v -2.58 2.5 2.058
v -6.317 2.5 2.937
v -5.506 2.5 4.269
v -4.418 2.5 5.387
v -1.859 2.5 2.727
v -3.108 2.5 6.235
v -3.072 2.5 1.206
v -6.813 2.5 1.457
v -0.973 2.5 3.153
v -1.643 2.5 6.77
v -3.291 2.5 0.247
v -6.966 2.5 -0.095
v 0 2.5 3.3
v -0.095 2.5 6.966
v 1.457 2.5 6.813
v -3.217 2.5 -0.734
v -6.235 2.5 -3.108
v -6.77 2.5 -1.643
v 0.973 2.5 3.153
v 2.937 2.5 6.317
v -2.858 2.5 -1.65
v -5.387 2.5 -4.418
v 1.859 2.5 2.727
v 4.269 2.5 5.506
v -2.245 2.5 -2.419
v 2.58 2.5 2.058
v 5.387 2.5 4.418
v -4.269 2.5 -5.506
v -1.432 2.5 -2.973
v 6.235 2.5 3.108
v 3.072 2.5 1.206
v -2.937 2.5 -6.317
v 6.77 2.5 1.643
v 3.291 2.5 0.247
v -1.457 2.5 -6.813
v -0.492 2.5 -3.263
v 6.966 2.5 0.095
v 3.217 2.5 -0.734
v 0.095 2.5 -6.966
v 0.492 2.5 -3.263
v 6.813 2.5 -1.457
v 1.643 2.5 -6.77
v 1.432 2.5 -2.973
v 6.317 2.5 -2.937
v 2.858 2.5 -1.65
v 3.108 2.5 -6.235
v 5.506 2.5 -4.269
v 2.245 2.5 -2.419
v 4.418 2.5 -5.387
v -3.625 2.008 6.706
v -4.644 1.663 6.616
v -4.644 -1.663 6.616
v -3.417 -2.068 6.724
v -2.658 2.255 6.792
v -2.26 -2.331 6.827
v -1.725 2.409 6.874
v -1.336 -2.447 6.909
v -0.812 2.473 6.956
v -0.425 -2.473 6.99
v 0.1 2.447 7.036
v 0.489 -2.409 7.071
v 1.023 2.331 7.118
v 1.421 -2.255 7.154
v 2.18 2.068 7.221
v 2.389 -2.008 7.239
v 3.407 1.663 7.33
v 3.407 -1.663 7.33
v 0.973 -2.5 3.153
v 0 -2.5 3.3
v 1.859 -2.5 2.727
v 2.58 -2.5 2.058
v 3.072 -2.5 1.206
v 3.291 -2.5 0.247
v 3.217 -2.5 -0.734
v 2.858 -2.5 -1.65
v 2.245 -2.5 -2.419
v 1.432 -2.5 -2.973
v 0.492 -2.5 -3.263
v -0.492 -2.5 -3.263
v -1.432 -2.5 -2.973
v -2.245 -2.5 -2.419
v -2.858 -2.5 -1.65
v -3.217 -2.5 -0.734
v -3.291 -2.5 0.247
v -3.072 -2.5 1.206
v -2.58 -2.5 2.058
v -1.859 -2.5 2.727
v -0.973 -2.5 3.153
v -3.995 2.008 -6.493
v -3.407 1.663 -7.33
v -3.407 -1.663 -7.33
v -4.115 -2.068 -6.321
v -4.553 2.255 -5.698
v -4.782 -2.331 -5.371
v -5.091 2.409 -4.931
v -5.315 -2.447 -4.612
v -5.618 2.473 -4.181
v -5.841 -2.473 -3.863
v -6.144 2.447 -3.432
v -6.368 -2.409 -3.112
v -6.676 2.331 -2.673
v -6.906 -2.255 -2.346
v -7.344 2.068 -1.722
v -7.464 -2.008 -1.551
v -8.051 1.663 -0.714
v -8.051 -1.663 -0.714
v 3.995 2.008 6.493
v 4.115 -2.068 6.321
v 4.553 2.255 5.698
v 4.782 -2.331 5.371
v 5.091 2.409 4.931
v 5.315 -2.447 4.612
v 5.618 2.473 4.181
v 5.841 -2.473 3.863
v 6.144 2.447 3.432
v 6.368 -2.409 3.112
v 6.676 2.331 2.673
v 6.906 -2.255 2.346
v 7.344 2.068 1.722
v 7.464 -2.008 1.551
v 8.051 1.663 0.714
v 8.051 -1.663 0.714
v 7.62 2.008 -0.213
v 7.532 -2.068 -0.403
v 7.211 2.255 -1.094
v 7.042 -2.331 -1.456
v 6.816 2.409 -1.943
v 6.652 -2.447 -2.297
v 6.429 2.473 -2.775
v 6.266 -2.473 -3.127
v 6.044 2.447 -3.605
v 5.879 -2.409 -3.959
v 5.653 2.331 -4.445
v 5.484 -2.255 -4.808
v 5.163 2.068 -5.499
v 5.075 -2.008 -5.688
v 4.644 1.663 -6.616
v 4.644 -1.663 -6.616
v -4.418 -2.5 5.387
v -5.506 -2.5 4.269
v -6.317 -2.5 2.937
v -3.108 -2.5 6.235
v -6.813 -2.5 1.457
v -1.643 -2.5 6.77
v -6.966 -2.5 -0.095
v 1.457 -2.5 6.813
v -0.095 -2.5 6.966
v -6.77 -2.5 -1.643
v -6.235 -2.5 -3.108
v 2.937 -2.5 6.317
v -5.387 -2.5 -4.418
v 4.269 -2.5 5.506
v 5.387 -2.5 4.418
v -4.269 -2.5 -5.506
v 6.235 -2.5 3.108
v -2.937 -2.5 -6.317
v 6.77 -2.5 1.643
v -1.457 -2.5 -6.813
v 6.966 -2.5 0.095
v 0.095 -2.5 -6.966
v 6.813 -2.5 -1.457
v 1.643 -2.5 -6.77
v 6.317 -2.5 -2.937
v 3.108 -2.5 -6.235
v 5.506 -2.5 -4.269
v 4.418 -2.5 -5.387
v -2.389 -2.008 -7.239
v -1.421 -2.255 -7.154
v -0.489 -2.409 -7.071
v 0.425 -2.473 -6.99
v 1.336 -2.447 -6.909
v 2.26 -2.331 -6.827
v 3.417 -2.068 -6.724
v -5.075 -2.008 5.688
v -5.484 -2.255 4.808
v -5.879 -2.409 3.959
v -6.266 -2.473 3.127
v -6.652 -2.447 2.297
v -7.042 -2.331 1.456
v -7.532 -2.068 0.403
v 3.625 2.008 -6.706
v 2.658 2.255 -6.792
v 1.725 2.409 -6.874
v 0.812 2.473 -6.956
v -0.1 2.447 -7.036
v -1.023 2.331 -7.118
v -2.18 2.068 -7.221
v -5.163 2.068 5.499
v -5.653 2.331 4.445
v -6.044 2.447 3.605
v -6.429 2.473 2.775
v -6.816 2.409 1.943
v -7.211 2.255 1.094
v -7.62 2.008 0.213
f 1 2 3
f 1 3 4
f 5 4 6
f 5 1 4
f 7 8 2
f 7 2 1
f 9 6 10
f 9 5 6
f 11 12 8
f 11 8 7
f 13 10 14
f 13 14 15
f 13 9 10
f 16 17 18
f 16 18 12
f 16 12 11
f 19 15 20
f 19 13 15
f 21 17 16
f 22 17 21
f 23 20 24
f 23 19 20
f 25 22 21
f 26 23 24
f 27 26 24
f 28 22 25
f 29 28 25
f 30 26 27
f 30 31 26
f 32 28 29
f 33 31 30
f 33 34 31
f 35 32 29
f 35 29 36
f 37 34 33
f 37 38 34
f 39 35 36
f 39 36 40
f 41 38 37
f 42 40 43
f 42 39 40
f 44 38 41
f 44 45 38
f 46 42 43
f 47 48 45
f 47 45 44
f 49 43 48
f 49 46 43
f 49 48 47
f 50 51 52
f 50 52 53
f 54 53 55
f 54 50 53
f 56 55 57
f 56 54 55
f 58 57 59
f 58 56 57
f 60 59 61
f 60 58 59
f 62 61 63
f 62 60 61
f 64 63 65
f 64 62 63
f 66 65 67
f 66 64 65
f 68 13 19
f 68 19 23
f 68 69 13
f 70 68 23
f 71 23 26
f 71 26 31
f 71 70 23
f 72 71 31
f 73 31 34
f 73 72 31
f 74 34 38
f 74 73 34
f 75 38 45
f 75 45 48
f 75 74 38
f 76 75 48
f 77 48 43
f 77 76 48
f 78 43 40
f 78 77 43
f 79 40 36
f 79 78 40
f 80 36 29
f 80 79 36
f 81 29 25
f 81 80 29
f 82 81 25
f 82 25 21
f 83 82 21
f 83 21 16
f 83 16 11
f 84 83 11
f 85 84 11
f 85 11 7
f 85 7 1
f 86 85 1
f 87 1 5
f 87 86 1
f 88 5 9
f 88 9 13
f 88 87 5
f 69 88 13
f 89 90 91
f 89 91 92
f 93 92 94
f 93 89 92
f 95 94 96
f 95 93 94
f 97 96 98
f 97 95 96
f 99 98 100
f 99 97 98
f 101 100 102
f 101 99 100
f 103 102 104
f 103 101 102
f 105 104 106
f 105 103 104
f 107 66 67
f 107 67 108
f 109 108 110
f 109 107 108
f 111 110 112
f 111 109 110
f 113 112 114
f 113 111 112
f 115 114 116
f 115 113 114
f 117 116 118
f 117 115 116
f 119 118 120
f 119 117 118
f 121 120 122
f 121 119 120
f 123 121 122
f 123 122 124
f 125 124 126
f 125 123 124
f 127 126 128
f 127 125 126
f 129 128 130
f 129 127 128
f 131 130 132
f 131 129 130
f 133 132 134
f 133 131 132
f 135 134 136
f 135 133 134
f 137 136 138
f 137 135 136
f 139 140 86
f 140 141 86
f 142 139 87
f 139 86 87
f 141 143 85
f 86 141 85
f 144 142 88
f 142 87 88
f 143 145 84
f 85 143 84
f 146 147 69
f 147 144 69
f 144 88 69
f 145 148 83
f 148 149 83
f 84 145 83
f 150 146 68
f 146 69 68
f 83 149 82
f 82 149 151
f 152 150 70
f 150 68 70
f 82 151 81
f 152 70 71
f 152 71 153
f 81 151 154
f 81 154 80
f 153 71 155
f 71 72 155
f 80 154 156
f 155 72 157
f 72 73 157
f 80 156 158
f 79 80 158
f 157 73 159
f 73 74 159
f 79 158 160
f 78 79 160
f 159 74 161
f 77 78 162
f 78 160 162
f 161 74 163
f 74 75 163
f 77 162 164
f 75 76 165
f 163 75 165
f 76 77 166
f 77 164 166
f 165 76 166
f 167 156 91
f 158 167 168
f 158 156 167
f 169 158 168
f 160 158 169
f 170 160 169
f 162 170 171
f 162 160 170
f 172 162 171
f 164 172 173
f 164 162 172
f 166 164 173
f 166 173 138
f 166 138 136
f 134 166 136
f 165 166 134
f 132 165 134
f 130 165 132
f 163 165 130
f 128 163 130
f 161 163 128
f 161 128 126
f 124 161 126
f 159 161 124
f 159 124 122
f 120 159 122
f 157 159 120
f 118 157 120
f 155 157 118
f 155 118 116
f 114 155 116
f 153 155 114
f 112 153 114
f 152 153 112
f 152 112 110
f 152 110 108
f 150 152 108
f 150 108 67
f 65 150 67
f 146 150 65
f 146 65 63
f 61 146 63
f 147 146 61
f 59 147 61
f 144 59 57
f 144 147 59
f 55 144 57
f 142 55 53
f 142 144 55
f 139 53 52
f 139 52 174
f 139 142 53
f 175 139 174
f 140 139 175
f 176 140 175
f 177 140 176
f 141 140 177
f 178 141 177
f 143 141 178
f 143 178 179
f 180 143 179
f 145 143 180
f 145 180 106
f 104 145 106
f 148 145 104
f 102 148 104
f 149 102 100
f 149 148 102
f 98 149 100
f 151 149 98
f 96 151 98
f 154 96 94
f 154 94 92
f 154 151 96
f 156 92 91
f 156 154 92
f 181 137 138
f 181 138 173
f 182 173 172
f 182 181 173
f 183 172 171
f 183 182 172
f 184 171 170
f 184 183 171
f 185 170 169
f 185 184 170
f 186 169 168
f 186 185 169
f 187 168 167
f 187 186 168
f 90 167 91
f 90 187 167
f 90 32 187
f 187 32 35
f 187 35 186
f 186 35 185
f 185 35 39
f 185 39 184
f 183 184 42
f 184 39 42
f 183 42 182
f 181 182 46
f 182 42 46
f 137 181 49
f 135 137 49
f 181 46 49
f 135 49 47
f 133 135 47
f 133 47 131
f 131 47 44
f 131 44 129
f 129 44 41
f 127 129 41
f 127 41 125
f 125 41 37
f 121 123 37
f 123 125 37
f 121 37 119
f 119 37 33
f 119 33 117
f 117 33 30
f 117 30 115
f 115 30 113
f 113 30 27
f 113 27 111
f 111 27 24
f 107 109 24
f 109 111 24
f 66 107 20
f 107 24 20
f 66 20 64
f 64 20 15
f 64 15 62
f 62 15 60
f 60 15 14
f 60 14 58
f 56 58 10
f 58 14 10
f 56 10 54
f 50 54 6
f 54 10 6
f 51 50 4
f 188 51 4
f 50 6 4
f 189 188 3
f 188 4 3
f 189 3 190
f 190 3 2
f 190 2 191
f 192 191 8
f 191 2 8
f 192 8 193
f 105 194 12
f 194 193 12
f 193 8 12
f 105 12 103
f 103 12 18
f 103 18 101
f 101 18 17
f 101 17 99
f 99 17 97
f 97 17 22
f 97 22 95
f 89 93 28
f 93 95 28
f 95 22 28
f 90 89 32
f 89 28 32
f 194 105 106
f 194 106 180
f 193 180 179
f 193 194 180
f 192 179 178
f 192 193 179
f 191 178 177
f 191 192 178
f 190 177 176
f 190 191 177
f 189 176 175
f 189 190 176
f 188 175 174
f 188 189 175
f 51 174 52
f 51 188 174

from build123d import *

# Parameters (mm, degrees)
SKETCH1_R           = 3.3
BOSS_EXTRUDE1_DEPTH = 2.5


with BuildPart() as part:
    # Sketch1 → Boss-Extrude1 (new, symmetric)
    with BuildSketch(Plane(origin=(0, 0, 0), x_dir=(1, 0, 0), z_dir=(0, 1, 0))):
        Polygon((8.051309858, -0.713962815), (4.643964864, 6.615657463), (-3.407344994, 7.329620279), (-8.051309858, 0.713962815), (-4.643964864, -6.615657463), (3.407344994, -7.329620279), align=None)
        with Locations(Location((0, 0, 0), (0, 0, 270))):
            Circle(SKETCH1_R, mode=Mode.SUBTRACT)
    extrude(amount=BOSS_EXTRUDE1_DEPTH, both=True)

    # Sketch2 → Cut-Revolve1 (revolve, cut)
    with BuildSketch(Plane.XY, mode=Mode.PRIVATE) as cut_revolve1_sk:
        Polygon((6.3, 3), (8.3, 3), (8.3, 1.5), align=None)
    cut_revolve1 = revolve(cut_revolve1_sk.sketch.rotate(Axis((0, 3.572353643, 0), (0, -1, 0)), 245.067539953), axis=Axis((0, 3.572353643, 0), (0, -1, 0)), mode=Mode.SUBTRACT)

    # Mirror1: Cut-Revolve1 across plane
    add(cut_revolve1.mirror(Plane.ZX), mode=Mode.SUBTRACT)


solid = part.part
